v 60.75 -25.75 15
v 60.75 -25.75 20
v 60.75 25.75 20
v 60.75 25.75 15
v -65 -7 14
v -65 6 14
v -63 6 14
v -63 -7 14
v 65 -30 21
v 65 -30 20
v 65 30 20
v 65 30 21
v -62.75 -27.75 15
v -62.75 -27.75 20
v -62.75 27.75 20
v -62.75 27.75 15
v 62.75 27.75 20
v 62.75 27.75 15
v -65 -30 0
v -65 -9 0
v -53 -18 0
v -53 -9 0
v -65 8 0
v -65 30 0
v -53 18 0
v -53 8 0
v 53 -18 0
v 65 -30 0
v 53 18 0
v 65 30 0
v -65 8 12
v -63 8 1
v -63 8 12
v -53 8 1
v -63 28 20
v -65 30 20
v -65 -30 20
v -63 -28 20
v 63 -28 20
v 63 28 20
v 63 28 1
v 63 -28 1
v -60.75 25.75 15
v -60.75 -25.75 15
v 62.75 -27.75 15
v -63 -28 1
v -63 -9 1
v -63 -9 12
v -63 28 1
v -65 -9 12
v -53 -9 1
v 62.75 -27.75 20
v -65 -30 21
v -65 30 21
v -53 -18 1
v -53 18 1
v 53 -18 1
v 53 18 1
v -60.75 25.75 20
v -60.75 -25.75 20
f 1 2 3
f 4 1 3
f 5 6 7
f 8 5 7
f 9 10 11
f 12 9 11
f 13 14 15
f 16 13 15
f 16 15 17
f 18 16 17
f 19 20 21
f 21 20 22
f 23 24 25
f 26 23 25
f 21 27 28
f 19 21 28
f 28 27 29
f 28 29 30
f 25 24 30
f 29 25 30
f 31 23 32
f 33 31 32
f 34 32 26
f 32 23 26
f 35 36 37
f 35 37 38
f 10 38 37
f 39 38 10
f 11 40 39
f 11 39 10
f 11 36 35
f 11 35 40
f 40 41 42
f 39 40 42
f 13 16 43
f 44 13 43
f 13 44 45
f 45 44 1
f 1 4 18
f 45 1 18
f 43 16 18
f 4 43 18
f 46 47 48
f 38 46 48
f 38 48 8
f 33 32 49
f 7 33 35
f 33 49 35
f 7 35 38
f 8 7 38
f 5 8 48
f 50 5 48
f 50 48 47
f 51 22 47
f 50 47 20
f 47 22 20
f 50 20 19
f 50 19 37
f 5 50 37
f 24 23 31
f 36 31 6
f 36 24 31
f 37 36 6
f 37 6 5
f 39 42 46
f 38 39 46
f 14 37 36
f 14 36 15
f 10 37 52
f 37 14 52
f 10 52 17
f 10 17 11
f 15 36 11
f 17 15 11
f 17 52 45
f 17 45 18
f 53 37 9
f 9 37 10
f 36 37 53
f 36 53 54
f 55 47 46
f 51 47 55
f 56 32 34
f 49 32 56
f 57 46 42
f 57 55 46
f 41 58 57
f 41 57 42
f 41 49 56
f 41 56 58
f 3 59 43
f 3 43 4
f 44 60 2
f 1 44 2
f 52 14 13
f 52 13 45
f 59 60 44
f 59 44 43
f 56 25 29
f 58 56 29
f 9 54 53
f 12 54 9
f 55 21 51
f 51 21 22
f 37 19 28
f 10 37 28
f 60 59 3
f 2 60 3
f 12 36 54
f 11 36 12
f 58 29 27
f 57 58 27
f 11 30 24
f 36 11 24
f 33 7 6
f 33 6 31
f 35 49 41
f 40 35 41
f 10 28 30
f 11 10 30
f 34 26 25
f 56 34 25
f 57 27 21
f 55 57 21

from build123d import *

# Parameters (mm, degrees)
EXTRUDE_THIN1_DEPTH = 20
EXTRUDE_THIN2_DEPTH = 1
SKETCH2_W           = 2
SKETCH2_H           = 17
EXTRUDE_THIN3_DEPTH = 6
BOSS_EXTRUDE1_DEPTH = 2
SKETCH4_W           = 130
SKETCH4_H           = 60
SKETCH4_W_2         = 126
SKETCH4_H_2         = 56
SKETCH4_W_3         = 125.5
SKETCH4_H_3         = 55.5
BOSS_EXTRUDE2_DEPTH = 1
SKETCH4_4_W         = 125.5
SKETCH4_4_H         = 55.5
SKETCH4_4_W_2       = 121.5
SKETCH4_4_H_2       = 51.5
EXTRUDE_THIN4_DEPTH = 5


with BuildPart() as part:
    # Sketch1 → Extrude-Thin1 (new body)
    with BuildSketch(Plane.XY):
        Polygon((-65, -8.999635986), (-65, -30), (65, -30), (65, 30), (-65, 30), (-65, 8.000364014), (-63, 8.000364014), (-63, 28), (63, 28), (63, -28), (-63, -28), (-63, -8.999635986), align=None)
    extrude(amount=EXTRUDE_THIN1_DEPTH)

    # Sketch1<2> → Extrude-Thin2 (add)
    with BuildSketch(Plane.XY):
        Polygon((-65, -8.999635986), (-65, -30), (65, -30), (65, 30), (-65, 30), (-65, 8.000364014), (-53, 8.000364014), (-53, 18), (53, 18), (53, -18), (-53, -18), (-53, -8.999635986), align=None)
    extrude(amount=EXTRUDE_THIN2_DEPTH)



with BuildPart() as body_2:
    # Sketch2 → Extrude-Thin3 (new body)
    with BuildSketch(Plane.XY.offset(14)):
        with Locations((-64, -0.499635986)):
            Rectangle(SKETCH2_W, SKETCH2_H)
    extrude(amount=EXTRUDE_THIN3_DEPTH)


with BuildPart() as part_1:
    add(part.part)

    add(body_2.part)  # Boss-Extrude1 merges body 2
    # Sketch3 → Boss-Extrude1 (add)
    with BuildSketch(Plane(origin=(-63, 0, 0), x_dir=(0, 0, -1), z_dir=(1, 0, 0))):
        Polygon((-14, -6.999635986), (-12, -8.999635986), (-14, -8.999635986), align=None)
        Polygon((-14, 6.000364014), (-12, 8.000364014), (-14, 8.000364014), align=None)
    extrude(amount=-BOSS_EXTRUDE1_DEPTH)


with BuildPart() as body_2_2:
    # Sketch4 → Boss-Extrude2 (new body)
    with BuildSketch(Plane.XY.offset(20)):
        Rectangle(SKETCH4_W, SKETCH4_H)
        Rectangle(SKETCH4_W_2, SKETCH4_H_2, mode=Mode.SUBTRACT)
        Rectangle(SKETCH4_W_2, SKETCH4_H_2)
        Rectangle(SKETCH4_W_3, SKETCH4_H_3, mode=Mode.SUBTRACT)
        Rectangle(SKETCH4_W_3, SKETCH4_H_3)
        Rectangle(SKETCH4_W, SKETCH4_H)
    extrude(amount=BOSS_EXTRUDE2_DEPTH)

    # Sketch4<4> → Extrude-Thin4 (add)
    with BuildSketch(Plane.XY.offset(20)):
        Rectangle(SKETCH4_4_W, SKETCH4_4_H)
        Rectangle(SKETCH4_4_W_2, SKETCH4_4_H_2, mode=Mode.SUBTRACT)
    extrude(amount=-EXTRUDE_THIN4_DEPTH)


solid = Compound([part_1.part, body_2_2.part])
